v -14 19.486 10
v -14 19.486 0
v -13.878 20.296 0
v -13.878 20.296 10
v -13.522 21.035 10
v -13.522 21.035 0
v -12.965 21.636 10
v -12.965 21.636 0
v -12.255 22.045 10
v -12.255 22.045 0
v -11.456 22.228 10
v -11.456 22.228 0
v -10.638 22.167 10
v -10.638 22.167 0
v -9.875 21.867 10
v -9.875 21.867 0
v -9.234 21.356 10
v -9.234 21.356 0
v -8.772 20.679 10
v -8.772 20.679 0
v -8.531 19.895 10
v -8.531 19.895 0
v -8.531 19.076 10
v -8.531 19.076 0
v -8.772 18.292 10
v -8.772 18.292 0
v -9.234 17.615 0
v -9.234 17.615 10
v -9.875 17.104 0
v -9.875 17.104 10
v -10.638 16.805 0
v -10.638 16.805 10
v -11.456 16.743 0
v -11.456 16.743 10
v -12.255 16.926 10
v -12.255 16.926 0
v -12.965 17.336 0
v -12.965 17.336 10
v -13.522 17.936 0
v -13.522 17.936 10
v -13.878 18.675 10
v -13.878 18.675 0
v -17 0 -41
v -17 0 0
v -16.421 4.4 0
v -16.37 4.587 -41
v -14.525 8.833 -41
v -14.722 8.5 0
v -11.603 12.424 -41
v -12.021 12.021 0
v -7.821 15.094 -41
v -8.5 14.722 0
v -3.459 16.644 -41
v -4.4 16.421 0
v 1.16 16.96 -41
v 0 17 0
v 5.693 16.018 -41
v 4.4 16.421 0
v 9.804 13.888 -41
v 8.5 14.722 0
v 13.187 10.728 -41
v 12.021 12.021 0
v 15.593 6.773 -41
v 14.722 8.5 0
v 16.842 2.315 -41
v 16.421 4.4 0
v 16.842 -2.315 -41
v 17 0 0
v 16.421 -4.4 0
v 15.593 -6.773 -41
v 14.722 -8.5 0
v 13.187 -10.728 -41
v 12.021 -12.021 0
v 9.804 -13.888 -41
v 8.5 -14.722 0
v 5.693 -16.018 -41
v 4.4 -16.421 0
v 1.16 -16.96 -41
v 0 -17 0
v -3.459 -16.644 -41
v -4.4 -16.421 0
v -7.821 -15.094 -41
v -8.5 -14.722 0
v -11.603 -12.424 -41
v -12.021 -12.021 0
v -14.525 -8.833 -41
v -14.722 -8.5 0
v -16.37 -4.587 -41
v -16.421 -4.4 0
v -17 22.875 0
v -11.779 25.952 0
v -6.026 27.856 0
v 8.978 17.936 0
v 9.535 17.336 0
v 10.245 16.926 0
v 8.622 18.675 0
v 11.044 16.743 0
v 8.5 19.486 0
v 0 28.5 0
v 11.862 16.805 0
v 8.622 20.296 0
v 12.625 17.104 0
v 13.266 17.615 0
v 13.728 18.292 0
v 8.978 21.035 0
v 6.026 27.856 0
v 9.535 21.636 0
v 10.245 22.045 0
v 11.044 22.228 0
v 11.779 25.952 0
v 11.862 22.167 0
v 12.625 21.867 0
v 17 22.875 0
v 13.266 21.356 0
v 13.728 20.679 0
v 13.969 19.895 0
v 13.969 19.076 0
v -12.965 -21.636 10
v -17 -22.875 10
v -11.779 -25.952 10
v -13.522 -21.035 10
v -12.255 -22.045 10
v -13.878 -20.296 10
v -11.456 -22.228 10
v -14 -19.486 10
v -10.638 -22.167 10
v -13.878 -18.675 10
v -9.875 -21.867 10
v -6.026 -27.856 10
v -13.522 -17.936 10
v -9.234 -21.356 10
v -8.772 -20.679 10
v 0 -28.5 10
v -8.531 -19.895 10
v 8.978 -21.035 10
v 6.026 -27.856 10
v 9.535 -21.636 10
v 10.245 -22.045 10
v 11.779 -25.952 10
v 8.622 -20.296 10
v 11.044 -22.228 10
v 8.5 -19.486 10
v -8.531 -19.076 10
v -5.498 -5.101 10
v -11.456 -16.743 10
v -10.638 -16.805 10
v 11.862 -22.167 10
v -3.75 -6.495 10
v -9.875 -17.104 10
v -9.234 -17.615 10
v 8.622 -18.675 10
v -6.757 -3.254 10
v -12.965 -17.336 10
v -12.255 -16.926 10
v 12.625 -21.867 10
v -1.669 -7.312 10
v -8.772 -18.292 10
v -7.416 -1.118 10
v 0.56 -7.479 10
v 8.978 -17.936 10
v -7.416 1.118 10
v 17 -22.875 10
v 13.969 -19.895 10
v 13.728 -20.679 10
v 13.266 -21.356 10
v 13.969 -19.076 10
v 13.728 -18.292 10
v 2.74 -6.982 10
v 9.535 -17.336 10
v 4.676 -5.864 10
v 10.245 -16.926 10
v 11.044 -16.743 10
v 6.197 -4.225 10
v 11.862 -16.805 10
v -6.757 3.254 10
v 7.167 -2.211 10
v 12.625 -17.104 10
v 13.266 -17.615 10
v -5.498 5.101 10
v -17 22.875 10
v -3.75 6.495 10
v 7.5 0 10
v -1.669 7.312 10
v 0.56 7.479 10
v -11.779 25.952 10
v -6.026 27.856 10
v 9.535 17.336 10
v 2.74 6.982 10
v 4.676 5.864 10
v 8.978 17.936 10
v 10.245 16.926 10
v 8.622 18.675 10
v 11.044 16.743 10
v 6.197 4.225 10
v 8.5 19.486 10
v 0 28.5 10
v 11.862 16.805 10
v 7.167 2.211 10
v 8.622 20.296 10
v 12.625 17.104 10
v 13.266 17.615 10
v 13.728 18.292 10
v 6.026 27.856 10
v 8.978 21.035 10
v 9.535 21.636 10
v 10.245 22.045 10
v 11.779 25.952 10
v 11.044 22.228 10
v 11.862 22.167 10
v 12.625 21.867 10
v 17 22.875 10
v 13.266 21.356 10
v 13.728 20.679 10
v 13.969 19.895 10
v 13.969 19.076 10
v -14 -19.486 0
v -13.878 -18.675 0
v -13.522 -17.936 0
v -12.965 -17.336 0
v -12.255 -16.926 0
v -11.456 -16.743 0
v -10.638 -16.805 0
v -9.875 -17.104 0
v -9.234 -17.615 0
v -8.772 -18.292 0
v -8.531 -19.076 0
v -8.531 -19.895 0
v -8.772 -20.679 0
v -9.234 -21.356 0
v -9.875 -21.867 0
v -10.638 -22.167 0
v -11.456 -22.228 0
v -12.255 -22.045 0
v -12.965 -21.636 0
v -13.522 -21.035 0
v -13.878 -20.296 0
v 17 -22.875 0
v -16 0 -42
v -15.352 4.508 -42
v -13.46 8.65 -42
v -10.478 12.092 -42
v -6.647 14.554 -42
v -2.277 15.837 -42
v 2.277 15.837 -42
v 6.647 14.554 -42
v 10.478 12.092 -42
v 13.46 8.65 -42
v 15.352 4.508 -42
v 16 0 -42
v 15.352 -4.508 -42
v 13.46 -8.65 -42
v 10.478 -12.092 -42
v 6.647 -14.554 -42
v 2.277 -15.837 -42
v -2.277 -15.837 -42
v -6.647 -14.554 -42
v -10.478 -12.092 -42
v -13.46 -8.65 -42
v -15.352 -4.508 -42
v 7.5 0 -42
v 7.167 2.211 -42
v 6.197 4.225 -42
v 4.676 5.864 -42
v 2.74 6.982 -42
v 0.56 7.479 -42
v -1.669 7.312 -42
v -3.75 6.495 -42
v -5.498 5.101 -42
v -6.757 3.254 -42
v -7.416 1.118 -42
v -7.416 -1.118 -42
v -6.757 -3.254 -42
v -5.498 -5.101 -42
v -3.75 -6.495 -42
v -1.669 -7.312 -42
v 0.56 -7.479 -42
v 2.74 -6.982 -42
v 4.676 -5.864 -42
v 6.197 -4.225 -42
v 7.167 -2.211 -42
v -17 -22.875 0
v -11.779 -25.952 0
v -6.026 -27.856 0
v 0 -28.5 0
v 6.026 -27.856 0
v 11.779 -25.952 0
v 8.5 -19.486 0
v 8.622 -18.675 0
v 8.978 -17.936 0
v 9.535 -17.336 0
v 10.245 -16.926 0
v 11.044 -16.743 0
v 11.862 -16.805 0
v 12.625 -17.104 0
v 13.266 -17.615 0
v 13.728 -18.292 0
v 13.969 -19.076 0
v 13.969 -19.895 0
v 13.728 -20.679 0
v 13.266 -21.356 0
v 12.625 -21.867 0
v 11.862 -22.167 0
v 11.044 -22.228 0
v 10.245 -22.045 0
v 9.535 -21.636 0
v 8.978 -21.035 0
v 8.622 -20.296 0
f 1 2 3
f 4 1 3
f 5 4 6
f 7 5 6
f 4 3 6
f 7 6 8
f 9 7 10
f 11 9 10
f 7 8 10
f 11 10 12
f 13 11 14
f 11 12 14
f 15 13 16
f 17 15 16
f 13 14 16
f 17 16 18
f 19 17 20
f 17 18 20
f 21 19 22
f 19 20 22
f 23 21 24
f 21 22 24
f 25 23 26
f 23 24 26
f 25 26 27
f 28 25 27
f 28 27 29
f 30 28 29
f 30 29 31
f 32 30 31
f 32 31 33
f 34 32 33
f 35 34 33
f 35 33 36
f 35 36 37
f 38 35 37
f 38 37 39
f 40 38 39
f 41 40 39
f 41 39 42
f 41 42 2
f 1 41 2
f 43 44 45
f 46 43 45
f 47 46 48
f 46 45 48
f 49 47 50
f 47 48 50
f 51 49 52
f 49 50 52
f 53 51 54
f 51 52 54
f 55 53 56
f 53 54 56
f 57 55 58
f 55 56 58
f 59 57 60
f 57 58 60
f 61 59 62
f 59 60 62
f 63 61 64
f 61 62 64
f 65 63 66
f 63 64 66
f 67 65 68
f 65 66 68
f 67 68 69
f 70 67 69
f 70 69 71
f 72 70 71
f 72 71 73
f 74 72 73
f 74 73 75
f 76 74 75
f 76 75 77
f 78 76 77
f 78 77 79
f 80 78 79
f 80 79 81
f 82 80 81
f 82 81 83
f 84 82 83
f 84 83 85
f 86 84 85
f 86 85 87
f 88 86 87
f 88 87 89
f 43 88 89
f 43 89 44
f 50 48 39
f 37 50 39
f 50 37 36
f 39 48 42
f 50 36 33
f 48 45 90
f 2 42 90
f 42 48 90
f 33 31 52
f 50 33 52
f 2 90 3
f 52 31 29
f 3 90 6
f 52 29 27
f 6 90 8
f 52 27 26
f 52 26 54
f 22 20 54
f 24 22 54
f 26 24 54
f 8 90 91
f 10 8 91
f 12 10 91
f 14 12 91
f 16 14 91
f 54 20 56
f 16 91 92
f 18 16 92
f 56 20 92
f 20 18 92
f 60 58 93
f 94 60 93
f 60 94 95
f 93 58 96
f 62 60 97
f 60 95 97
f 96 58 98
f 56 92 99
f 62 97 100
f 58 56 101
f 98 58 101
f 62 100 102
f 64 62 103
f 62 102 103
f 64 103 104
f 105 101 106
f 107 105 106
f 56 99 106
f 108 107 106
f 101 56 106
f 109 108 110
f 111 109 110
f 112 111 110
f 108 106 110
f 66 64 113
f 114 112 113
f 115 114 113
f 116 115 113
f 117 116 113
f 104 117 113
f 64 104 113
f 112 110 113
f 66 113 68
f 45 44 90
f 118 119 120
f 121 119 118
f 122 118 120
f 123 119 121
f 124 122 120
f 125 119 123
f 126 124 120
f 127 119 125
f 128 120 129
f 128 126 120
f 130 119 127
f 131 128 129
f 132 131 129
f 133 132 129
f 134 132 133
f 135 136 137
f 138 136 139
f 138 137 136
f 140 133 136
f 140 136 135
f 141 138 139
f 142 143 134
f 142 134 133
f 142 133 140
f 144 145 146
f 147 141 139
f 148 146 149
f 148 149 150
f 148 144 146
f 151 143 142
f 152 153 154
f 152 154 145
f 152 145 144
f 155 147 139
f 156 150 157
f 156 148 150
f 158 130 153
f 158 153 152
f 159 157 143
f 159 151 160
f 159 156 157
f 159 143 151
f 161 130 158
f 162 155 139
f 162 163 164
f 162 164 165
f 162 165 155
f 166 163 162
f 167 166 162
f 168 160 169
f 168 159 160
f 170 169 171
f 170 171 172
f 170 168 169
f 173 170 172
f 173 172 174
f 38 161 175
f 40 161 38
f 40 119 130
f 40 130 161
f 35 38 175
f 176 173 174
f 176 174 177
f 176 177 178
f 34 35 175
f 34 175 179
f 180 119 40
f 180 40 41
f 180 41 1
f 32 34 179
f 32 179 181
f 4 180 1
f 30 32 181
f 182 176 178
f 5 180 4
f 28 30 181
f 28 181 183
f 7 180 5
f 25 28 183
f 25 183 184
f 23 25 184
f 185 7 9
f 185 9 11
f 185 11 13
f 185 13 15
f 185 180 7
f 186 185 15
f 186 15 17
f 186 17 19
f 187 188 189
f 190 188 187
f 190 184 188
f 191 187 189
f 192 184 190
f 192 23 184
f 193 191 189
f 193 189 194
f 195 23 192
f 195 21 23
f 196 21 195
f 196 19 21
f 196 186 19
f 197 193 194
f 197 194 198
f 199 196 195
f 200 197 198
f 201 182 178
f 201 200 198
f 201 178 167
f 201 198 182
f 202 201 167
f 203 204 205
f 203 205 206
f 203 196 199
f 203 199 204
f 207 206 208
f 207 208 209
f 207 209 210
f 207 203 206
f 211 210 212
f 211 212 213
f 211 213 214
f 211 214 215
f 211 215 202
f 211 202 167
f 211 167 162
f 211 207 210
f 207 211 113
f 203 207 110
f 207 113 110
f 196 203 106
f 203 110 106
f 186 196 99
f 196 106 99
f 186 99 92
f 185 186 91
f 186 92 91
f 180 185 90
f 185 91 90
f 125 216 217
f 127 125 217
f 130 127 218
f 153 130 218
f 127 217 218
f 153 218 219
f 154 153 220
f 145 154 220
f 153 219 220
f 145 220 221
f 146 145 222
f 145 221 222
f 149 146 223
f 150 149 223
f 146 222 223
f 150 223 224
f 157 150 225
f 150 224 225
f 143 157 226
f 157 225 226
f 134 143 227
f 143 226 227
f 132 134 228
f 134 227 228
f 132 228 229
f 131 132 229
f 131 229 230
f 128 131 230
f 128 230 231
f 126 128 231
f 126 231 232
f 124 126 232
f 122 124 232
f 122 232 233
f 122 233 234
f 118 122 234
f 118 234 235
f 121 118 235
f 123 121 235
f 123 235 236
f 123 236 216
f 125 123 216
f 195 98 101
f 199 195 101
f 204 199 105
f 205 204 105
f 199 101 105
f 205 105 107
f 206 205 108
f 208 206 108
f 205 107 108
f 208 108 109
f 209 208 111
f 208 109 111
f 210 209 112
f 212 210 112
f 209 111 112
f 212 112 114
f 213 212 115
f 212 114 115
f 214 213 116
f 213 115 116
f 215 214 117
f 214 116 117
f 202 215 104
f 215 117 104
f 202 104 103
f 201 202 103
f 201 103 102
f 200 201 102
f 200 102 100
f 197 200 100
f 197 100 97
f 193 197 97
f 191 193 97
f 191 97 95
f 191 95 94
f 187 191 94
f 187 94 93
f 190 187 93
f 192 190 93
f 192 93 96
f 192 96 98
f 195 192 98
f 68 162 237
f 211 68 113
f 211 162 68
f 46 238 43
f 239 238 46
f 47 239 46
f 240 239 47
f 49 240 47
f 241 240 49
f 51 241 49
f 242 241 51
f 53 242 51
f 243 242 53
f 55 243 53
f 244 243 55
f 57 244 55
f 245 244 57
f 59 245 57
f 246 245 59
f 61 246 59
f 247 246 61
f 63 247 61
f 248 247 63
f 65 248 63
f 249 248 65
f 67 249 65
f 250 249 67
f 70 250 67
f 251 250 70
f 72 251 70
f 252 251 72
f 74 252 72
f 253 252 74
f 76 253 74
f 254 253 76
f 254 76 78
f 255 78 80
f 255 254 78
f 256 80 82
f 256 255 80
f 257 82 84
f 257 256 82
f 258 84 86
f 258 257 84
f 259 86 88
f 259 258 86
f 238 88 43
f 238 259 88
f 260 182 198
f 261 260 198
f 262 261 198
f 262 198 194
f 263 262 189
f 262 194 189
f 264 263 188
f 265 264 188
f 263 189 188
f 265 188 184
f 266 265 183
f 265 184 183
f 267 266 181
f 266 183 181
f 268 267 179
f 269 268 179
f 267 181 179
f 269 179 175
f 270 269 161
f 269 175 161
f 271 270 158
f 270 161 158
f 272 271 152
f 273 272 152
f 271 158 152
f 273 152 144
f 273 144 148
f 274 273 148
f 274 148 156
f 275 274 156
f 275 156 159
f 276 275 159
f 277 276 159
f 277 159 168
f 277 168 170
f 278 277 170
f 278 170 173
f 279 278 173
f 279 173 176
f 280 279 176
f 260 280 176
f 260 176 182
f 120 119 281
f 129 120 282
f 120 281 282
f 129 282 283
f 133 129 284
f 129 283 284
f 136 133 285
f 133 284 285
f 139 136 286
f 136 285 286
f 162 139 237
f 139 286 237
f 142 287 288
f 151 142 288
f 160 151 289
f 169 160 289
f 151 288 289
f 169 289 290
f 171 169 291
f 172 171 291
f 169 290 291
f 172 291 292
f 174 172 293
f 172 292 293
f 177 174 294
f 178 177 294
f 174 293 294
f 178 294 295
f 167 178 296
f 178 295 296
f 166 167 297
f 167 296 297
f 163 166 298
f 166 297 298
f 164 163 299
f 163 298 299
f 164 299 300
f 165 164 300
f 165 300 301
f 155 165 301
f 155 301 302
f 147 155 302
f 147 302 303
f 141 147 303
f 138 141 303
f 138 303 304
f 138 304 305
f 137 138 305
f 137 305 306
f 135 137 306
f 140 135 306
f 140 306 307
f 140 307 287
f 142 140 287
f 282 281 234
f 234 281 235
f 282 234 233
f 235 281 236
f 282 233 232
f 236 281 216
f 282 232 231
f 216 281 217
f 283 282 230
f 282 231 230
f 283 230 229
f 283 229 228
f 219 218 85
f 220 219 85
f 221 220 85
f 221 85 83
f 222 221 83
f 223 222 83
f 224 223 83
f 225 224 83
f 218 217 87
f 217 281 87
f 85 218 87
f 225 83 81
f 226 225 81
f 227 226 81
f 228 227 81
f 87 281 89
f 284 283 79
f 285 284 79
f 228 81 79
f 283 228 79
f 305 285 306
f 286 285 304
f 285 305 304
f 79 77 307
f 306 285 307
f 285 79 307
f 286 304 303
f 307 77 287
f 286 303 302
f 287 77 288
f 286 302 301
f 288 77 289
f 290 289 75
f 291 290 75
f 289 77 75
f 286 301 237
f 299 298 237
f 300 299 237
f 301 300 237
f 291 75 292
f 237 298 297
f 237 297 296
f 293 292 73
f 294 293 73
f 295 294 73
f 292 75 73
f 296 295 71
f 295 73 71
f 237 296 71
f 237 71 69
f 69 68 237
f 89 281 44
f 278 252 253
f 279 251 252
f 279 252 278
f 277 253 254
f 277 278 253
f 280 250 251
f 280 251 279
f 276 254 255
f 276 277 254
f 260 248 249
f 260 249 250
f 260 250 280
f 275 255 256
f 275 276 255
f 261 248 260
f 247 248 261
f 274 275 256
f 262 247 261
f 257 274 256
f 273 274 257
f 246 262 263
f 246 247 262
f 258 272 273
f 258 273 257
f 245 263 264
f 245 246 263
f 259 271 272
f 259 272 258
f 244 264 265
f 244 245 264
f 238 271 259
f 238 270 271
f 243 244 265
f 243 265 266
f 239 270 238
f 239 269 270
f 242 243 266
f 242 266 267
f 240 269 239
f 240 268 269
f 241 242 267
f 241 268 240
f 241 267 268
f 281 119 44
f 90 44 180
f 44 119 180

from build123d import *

# Parameters (mm, degrees)
SKETCH_1_R          = 28.5
EXTRUDE_1_DEPTH     = 10
SKETCH_2_W          = 42.780685773
SKETCH_2_H          = 76.581039372
CUT_EXTRUDE_1_DEPTH = 42.527099586
SKETCH_3_R          = 17
EXTRUDE_2_DEPTH     = 42
SKETCH_4_R          = 2.75
CUT_EXTRUDE_2_DEPTH = 42
SKETCH_5_R          = 7.5
CUT_EXTRUDE_3_DEPTH = 62.686708455
CHAMFER_1_SIZE      = 1


with BuildPart() as part:
    # 草图1 → 凸台-拉伸1 (new body)
    with BuildSketch(Plane.XY):
        Circle(SKETCH_1_R)
    extrude(amount=EXTRUDE_1_DEPTH)

    # 草图2 → 切除-拉伸1 (cut, through all)
    with BuildSketch(Plane.XY.offset(10)):
        with Locations((-38.390342887, -1.01716671)):
            Rectangle(SKETCH_2_W, SKETCH_2_H)
        with Locations((38.390342887, -1.01716671)):
            Rectangle(SKETCH_2_W, SKETCH_2_H)
    extrude(amount=-CUT_EXTRUDE_1_DEPTH, mode=Mode.SUBTRACT)

    # 草图3 → 凸台-拉伸2 (add)
    with BuildSketch(Plane(origin=(0, 0, 0), x_dir=(-1, 0, 0), z_dir=(0, 0, -1))):
        Circle(SKETCH_3_R)
    extrude(amount=EXTRUDE_2_DEPTH)

    # 草图4 → 切除-拉伸2 (cut)
    with BuildSketch(Plane(origin=(0, 0, 0), x_dir=(-1, 0, 0), z_dir=(0, 0, -1))):
        with Locations((-11.25, 19.485571585)):
            Circle(SKETCH_4_R)
        with Locations((11.25, 19.485571585)):
            Circle(SKETCH_4_R)
        with Locations((11.25, -19.485571585)):
            Circle(SKETCH_4_R)
        with Locations((-11.25, -19.485571585)):
            Circle(SKETCH_4_R)
    extrude(amount=-CUT_EXTRUDE_2_DEPTH, mode=Mode.SUBTRACT)

    # 草图5 → 切除-拉伸3 (cut, through all)
    with BuildSketch(Plane.XY.offset(10)):
        Circle(SKETCH_5_R)
    extrude(amount=-CUT_EXTRUDE_3_DEPTH, mode=Mode.SUBTRACT)

    # 倒角1
    chamfer_1_edges = [part.edges().sort_by_distance(p)[0] for p in [
        (17, 0, -42),
    ]]
    chamfer(chamfer_1_edges, length=CHAMFER_1_SIZE)


solid = part.part
